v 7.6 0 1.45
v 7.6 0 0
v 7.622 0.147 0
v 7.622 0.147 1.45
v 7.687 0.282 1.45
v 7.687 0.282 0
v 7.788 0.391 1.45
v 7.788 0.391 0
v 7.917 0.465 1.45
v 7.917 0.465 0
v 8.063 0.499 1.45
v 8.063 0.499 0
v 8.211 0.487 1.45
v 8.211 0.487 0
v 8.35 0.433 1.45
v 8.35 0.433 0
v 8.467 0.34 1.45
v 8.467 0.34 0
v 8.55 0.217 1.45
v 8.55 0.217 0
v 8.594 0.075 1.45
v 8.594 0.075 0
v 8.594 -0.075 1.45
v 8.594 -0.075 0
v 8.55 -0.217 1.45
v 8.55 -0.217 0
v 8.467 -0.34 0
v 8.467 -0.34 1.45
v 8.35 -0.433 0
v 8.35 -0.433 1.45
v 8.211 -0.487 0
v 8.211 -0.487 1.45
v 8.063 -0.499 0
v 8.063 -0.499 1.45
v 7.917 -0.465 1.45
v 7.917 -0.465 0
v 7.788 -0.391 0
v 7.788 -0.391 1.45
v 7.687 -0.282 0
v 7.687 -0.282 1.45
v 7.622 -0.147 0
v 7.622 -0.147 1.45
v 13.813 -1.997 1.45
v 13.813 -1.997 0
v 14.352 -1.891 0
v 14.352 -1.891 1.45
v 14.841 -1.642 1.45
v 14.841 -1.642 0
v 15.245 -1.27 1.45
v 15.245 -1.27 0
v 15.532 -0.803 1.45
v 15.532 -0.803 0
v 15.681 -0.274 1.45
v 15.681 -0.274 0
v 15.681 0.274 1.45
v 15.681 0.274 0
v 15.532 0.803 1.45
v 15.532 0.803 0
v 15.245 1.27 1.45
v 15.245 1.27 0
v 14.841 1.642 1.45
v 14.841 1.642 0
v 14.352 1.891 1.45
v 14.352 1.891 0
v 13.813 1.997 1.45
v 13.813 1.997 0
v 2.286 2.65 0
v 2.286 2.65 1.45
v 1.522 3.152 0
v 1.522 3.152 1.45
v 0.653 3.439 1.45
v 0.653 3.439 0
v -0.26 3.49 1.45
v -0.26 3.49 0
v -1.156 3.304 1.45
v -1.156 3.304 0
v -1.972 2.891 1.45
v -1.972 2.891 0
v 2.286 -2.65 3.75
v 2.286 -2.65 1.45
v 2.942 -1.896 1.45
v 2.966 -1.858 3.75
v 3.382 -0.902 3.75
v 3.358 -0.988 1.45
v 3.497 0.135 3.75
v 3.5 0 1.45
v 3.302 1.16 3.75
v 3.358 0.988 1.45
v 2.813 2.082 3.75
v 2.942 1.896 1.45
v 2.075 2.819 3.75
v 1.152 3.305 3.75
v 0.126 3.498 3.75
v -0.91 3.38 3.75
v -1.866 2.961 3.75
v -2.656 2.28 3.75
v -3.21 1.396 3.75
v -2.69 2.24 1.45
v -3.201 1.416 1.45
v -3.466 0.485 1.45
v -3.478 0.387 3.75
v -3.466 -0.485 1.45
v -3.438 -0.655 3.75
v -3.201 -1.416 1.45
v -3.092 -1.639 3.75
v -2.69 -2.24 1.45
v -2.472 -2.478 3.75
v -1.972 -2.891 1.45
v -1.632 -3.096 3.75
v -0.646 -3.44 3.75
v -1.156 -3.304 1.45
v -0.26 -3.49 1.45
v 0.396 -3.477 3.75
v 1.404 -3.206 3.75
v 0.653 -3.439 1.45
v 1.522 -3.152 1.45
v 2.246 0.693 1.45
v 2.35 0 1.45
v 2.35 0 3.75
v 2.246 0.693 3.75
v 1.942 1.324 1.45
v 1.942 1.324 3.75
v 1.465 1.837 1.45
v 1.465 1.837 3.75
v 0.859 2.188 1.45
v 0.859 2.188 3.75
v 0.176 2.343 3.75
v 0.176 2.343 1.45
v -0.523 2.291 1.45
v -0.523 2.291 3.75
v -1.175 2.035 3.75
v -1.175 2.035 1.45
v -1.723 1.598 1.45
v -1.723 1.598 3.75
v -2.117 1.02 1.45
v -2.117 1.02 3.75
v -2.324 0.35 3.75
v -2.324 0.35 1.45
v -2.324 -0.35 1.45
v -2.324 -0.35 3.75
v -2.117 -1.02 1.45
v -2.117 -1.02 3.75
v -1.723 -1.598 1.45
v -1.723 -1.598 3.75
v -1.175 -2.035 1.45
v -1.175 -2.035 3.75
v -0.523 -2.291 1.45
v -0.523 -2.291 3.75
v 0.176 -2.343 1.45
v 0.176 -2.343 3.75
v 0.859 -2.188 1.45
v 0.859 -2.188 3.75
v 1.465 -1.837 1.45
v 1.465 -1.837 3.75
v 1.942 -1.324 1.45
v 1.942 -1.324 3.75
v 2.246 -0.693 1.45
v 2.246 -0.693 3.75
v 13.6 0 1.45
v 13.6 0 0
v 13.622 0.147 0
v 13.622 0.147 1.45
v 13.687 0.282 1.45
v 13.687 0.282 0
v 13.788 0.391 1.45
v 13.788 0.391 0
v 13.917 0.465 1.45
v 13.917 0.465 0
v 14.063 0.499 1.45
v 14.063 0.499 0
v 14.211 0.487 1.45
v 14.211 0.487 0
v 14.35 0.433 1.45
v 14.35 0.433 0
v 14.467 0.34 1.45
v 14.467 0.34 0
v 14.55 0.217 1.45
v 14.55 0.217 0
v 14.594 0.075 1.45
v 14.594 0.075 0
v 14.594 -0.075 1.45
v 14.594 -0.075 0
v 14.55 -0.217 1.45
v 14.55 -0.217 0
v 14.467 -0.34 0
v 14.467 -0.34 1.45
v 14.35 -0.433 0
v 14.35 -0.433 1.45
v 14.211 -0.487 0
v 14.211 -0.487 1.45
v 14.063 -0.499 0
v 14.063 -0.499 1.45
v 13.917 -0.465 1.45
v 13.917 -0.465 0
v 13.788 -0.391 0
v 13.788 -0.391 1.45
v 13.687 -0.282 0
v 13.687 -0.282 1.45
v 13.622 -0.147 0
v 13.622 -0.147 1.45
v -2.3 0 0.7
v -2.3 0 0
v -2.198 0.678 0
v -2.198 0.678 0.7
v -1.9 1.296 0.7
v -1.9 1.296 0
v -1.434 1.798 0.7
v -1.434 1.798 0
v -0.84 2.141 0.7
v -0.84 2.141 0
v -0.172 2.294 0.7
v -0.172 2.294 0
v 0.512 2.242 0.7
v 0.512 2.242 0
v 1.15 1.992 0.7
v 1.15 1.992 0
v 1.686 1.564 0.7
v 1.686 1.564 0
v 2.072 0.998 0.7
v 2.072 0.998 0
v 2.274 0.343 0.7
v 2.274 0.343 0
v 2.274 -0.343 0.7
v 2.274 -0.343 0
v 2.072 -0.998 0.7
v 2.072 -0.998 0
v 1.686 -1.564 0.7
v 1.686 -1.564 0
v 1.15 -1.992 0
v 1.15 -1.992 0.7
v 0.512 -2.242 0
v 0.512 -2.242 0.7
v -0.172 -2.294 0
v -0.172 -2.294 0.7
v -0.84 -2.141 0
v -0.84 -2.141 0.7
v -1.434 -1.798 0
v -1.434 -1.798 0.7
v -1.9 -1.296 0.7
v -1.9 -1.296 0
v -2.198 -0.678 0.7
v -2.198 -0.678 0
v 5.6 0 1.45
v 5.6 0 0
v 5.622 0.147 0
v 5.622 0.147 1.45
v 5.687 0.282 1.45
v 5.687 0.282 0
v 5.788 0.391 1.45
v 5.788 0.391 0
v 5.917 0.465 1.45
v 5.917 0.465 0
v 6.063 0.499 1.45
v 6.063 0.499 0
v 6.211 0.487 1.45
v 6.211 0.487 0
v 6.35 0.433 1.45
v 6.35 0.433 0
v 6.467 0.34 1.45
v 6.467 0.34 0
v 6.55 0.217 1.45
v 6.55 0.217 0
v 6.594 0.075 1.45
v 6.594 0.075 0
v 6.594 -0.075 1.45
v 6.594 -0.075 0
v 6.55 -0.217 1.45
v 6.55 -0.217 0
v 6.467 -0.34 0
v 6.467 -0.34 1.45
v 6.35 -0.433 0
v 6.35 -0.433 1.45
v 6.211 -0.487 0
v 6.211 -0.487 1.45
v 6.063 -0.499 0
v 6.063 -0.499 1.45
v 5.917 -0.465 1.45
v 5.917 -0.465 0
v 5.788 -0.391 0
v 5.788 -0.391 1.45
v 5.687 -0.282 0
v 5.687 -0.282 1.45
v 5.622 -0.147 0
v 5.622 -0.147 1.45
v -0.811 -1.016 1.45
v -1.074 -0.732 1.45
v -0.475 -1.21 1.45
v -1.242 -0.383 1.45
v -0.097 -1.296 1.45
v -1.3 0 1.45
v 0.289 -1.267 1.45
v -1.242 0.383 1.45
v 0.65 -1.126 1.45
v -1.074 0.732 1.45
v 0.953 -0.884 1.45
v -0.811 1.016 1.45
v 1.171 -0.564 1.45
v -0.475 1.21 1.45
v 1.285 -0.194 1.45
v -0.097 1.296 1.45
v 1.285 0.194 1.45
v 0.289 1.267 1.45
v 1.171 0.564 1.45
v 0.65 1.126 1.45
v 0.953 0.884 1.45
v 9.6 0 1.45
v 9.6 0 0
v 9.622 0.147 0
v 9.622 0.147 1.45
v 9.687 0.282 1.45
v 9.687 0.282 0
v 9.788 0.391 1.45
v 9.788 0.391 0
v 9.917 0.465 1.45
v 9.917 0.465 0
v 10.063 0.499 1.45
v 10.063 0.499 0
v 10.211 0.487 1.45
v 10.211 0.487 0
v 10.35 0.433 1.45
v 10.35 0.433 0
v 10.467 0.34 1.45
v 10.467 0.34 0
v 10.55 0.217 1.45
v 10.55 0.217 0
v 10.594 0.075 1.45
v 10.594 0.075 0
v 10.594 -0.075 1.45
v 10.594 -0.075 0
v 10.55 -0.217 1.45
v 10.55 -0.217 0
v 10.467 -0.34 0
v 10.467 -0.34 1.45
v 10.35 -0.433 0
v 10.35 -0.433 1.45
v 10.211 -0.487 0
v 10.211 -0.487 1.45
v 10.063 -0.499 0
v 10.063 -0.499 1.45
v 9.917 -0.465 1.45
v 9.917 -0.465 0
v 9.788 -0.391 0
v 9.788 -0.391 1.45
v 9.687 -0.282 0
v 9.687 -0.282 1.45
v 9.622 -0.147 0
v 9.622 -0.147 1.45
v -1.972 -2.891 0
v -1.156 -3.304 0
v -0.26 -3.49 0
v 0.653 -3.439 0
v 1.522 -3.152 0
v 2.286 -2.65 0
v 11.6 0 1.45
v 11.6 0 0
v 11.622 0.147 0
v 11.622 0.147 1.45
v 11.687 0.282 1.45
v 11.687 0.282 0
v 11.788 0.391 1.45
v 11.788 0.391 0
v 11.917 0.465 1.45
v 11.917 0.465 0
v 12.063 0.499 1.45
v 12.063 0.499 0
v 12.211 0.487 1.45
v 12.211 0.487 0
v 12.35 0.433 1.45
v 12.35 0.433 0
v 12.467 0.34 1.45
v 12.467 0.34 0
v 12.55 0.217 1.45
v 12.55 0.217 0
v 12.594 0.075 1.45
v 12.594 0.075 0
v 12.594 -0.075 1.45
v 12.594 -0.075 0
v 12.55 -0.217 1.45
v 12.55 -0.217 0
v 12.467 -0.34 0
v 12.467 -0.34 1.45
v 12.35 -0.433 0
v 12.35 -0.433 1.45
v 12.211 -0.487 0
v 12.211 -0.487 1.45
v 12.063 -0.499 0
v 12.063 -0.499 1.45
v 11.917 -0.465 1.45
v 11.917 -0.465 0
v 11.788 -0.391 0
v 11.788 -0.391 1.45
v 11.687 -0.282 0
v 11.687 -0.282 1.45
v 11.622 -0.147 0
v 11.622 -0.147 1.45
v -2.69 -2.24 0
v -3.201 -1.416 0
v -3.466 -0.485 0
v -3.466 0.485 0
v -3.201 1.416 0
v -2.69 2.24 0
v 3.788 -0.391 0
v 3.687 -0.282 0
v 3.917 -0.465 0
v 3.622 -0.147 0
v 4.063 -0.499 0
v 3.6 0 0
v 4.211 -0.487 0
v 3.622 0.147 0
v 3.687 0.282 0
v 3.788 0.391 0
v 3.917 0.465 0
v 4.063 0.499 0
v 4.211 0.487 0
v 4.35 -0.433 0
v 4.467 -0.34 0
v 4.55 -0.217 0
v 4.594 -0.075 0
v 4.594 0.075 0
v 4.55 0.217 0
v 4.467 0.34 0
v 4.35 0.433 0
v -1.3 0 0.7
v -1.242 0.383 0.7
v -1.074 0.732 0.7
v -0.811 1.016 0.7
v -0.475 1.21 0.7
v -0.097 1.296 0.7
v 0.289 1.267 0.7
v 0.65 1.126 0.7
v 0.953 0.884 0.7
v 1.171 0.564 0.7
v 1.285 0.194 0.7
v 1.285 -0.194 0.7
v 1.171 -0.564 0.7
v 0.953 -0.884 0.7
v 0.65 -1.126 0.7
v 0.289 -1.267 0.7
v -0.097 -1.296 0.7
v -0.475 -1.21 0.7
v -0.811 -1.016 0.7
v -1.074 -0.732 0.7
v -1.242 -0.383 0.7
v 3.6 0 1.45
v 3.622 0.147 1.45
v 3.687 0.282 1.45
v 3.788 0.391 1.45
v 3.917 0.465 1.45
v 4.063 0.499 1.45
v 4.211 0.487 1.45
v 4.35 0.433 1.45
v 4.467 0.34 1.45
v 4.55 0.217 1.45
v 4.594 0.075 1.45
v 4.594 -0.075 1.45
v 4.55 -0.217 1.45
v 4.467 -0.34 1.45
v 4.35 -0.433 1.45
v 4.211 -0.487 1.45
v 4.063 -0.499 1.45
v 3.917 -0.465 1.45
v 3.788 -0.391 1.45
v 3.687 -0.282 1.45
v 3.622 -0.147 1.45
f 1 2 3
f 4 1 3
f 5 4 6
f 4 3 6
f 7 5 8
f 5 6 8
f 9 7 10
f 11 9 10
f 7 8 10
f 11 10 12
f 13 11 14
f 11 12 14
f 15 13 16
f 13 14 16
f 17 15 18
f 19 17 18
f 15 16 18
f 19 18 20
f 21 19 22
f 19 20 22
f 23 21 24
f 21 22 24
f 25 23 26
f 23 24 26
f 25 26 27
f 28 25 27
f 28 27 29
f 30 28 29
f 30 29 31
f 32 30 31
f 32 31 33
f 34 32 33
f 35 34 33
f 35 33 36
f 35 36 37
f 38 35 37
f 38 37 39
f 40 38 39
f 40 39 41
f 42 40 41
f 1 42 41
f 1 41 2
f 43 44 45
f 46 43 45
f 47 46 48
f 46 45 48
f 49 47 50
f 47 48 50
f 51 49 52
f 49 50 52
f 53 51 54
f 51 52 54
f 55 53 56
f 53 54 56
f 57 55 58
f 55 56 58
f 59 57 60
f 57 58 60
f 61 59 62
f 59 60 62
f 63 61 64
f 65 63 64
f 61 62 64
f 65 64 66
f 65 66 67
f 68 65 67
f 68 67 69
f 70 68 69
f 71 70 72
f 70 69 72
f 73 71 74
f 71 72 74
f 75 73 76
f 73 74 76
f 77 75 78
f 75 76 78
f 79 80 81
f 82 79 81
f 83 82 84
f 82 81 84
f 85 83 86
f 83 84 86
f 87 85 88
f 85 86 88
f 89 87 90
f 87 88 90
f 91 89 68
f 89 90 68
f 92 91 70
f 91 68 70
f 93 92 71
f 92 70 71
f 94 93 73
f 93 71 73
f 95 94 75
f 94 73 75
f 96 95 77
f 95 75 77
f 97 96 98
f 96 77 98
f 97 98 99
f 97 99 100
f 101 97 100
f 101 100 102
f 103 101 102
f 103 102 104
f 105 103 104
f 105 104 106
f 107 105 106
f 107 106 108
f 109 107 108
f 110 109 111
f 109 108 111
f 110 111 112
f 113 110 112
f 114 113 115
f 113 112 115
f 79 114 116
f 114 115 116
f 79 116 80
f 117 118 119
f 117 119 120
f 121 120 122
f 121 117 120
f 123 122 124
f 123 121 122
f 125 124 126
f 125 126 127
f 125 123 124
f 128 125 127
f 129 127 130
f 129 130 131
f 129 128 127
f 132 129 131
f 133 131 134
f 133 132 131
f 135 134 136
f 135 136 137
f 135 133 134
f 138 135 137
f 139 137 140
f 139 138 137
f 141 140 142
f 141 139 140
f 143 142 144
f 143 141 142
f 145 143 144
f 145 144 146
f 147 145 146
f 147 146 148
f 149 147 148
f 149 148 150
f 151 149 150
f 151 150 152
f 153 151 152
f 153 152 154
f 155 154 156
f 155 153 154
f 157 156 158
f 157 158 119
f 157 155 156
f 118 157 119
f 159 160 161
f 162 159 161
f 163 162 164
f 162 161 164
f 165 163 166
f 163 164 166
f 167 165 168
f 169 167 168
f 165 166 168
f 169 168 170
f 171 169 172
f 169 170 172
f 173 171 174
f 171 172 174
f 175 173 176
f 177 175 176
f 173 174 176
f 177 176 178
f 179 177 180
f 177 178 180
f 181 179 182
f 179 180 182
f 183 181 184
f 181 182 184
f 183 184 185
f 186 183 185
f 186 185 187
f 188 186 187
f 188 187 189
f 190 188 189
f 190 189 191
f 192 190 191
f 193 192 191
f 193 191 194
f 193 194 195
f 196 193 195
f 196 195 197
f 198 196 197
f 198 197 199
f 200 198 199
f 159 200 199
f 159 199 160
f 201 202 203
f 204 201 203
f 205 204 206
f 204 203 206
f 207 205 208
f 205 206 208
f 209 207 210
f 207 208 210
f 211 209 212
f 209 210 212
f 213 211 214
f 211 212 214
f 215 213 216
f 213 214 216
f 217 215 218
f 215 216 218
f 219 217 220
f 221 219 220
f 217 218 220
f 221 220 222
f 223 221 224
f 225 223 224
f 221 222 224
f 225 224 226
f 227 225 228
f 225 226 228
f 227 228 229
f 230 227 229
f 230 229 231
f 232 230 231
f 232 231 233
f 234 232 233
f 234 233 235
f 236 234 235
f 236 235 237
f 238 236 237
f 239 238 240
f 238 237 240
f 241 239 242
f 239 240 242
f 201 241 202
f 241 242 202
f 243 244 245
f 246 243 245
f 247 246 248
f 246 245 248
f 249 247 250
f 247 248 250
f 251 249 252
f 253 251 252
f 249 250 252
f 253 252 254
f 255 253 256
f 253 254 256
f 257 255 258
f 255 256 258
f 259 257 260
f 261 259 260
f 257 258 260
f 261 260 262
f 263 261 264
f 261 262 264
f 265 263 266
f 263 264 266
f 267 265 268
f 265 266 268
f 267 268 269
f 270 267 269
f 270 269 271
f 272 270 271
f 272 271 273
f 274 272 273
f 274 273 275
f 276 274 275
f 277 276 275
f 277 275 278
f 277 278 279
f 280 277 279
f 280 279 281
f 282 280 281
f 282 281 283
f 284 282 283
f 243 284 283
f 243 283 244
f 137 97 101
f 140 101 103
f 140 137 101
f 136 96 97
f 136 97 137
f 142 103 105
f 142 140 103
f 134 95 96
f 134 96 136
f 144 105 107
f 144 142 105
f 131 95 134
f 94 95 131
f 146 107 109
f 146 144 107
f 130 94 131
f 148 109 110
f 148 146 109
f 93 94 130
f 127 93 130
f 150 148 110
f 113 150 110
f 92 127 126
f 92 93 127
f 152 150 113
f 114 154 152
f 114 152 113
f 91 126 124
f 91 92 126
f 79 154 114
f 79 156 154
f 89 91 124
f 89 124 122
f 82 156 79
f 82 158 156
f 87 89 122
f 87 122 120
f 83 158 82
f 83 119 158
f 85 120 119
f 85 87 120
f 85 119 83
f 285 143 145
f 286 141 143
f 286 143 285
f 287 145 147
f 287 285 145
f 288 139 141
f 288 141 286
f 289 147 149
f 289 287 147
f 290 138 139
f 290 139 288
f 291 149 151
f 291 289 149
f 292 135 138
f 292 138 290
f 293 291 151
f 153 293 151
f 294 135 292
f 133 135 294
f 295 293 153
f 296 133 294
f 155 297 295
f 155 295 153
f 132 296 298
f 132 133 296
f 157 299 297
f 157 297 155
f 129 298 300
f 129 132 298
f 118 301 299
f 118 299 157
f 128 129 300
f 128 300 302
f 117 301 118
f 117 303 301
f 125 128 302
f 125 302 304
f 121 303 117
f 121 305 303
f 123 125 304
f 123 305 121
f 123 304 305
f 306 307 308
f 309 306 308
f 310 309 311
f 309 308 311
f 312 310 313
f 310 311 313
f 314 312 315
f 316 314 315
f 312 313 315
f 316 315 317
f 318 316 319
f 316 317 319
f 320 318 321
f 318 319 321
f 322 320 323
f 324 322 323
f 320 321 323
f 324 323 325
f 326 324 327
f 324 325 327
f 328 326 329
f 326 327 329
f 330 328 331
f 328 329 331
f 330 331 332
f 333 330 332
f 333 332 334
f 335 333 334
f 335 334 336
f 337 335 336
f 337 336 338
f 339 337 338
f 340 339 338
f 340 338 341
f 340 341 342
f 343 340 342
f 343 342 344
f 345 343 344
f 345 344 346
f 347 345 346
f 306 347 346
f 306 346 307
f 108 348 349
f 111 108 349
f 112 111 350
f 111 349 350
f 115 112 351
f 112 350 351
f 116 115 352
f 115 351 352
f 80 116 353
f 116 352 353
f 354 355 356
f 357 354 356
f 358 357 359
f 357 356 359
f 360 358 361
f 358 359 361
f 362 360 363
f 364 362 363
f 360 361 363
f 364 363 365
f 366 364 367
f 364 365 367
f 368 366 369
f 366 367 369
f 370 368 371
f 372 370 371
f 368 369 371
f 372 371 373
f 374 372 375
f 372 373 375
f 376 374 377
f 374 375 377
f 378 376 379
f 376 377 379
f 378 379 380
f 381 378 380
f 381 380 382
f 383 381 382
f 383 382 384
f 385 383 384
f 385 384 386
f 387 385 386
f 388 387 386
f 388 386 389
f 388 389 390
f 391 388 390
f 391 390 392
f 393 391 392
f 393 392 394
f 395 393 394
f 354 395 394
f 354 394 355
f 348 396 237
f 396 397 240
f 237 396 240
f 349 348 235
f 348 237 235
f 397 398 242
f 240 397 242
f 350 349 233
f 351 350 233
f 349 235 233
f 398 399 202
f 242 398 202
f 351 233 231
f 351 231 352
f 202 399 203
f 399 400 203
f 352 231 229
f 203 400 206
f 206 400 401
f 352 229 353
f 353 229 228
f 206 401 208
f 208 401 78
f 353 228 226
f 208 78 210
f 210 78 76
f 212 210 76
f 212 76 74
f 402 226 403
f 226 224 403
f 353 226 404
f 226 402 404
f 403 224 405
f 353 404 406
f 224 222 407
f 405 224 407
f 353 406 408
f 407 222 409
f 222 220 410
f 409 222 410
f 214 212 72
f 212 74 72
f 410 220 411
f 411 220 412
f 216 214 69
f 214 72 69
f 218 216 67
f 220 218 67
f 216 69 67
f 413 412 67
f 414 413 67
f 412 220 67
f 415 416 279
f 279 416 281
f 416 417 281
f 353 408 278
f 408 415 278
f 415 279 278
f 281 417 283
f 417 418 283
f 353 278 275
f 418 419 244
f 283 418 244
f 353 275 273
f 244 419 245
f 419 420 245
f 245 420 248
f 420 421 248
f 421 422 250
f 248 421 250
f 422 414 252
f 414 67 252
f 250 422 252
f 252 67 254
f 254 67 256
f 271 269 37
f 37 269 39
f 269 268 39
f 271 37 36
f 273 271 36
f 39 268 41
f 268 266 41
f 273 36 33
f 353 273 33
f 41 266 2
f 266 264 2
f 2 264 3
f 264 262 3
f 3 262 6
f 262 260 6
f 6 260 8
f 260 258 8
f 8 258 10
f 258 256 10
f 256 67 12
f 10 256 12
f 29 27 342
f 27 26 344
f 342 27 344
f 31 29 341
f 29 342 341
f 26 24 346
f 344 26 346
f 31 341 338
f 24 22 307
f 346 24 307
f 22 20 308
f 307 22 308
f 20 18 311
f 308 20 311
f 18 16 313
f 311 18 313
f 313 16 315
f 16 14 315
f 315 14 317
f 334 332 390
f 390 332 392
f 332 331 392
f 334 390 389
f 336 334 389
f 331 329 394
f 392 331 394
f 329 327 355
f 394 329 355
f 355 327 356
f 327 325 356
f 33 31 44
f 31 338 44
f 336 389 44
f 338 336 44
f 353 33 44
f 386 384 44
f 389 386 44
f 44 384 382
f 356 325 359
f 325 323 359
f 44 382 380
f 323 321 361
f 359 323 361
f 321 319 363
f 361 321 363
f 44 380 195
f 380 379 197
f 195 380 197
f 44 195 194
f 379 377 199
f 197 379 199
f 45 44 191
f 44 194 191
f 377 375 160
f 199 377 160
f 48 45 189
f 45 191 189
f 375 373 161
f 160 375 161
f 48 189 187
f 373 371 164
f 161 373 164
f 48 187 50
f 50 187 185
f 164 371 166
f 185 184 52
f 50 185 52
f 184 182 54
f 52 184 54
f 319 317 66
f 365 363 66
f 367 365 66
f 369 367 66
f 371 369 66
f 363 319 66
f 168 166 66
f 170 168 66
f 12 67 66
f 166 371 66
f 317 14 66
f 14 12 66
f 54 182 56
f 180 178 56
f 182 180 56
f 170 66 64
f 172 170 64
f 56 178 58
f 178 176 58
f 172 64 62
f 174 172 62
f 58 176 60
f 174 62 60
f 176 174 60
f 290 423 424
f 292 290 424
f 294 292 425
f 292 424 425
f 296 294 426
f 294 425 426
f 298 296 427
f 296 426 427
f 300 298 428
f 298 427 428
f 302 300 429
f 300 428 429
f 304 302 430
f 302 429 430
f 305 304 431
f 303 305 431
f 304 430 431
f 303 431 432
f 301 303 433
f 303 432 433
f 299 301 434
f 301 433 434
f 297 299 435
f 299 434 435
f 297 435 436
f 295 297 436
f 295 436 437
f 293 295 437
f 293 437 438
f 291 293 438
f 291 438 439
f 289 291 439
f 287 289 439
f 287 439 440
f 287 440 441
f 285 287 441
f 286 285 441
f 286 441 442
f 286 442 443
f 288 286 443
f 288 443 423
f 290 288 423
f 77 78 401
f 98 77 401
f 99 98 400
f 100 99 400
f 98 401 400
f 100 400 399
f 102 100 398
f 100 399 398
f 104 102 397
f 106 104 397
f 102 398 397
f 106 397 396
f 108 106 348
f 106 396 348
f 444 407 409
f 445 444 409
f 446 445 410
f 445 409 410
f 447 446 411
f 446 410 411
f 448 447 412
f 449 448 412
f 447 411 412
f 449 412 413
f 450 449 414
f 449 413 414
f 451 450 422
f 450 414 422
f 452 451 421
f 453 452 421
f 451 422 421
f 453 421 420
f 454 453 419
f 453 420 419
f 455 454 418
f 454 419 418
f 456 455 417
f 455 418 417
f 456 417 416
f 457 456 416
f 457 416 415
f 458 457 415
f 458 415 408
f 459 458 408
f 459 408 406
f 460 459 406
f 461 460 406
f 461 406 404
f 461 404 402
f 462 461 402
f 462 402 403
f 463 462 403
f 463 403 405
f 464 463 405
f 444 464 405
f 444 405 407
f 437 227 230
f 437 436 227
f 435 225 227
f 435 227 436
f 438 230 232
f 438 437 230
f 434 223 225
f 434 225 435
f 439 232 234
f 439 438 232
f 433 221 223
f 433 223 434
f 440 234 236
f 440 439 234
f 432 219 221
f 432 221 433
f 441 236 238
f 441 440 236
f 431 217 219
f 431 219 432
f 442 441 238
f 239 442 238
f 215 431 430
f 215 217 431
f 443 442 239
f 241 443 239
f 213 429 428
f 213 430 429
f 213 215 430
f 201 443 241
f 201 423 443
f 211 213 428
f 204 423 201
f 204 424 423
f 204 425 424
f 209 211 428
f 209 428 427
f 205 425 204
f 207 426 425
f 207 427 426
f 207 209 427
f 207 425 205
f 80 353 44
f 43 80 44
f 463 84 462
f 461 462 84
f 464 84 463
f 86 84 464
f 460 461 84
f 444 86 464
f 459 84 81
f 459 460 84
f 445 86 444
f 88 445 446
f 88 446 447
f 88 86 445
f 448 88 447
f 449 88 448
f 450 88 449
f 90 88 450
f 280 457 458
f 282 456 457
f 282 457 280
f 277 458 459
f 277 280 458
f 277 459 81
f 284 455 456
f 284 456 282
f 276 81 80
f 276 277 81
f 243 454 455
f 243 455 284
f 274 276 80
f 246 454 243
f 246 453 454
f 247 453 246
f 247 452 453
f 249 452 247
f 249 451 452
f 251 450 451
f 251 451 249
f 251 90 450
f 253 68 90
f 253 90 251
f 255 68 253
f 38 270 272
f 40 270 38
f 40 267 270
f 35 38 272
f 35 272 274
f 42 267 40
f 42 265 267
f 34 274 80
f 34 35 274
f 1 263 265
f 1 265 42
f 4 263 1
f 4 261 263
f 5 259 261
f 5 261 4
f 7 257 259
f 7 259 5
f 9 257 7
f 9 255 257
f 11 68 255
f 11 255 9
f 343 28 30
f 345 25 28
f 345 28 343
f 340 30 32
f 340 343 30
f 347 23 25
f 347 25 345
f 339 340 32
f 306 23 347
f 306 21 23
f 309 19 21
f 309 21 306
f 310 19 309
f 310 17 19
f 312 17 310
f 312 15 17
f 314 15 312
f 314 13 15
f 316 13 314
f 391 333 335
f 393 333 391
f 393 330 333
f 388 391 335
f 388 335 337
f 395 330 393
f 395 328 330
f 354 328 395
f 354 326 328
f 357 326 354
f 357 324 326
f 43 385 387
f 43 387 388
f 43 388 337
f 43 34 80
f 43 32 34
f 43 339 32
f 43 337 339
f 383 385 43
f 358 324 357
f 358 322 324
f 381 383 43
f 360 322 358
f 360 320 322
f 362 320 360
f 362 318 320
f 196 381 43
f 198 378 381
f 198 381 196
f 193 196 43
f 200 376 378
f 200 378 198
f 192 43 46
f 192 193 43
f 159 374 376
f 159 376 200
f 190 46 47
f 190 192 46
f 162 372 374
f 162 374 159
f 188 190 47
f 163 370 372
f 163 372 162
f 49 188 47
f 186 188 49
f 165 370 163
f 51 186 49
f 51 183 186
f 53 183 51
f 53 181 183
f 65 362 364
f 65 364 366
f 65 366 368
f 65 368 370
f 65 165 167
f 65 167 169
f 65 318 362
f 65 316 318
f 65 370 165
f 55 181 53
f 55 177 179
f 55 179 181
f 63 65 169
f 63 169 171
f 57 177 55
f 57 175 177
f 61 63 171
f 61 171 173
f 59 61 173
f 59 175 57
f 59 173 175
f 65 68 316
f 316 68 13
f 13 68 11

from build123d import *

# Parameters (mm, degrees)
SKETCH_1_R             = 2.775112647
SKETCH_1_R_2           = 2
SKETCH_1_R_3           = 3.5
EXTRUDE_1_DEPTH        = 1.45
SKETCH_2_R             = 3.5
SKETCH_2_R_2           = 2.35
EXTRUDE_2_DEPTH        = 2.3
SKETCH_3_R             = 2.3
CUT_EXTRUDE_1_DEPTH    = 0.7
SKETCH_4_R             = 1.3
CUT_EXTRUDE_2_DEPTH    = 17.372003543
SKETCH_5_R             = 0.5
CUT_EXTRUDE_3_DEPTH    = 17.516733939
PATTERN_LINEAR_1_COUNT = 6
PATTERN_LINEAR_1_PITCH = 2


with BuildPart() as part:
    # 草图1 → 凸台-拉伸1 (new body)
    with BuildSketch(Plane.XY):
        with BuildLine():
            Line((0.157009161, 2.770667488), (-1.972354438, 2.891334981))
            ThreePointArc((-1.972354438, 2.891334981), (-3.5, 0), (-1.972354438, -2.891334981))
            Line((-1.972354438, -2.891334981), (0.1570091, -2.770667491))
            ThreePointArc((0.1570091, -2.770667491), (-2.775112647, 3.1e-08), (0.157009161, 2.770667488))
        make_face()
        with BuildLine():
            Line((2.286372673, 2.65), (0.157009161, 2.770667488))
            ThreePointArc((0.157009161, 2.770667488), (2.017048378, 1.905981649), (2.775112647, 0))
            ThreePointArc((2.775112647, 0), (2.017048356, -1.905981672), (0.1570091, -2.770667491))
            Line((0.1570091, -2.770667491), (2.286372673, -2.65))
            ThreePointArc((2.286372673, -2.65), (3.182161557, -1.457342726), (3.5, 0))
            ThreePointArc((3.5, 0), (3.182161557, 1.457342726), (2.286372673, 2.65))
        make_face()
        Circle(SKETCH_1_R)
        with BuildLine():
            ThreePointArc((2.286372673, 2.65), (0.198021479, 3.494393723), (-1.972354438, 2.891334981))
            Line((-1.972354438, 2.891334981), (0.157009161, 2.770667488))
            Line((0.157009161, 2.770667488), (2.286372673, 2.65))
        make_face()
        with BuildLine():
            Line((0.1570091, -2.770667491), (-1.972354438, -2.891334981))
            ThreePointArc((-1.972354438, -2.891334981), (0.198021479, -3.494393723), (2.286372673, -2.65))
            Line((2.286372673, -2.65), (0.1570091, -2.770667491))
        make_face()
        with BuildLine():
            Line((13.813155138, 1.996796413), (2.286372673, 2.65))
            ThreePointArc((2.286372673, 2.65), (3.182161557, 1.457342726), (3.5, 0))
            ThreePointArc((3.5, 0), (3.182161557, -1.457342726), (2.286372673, -2.65))
            Line((2.286372673, -2.65), (13.813155123, -1.996796414))
            ThreePointArc((13.813155123, -1.996796414), (11.7, 8e-09), (13.813155138, 1.996796413))
        make_face()
        with Locations((13.7, 0)):
            Circle(SKETCH_1_R_2)
        Circle(SKETCH_1_R_3)
    extrude(amount=EXTRUDE_1_DEPTH)

    # 草图2 → 凸台-拉伸2 (add)
    with BuildSketch(Plane.XY.offset(1.45)):
        with Locations(Location((0, 0, 0), (0, 0, 310.787038193))):
            Circle(SKETCH_2_R)
        Circle(SKETCH_2_R_2, mode=Mode.SUBTRACT)
    extrude(amount=EXTRUDE_2_DEPTH)

    # 草图3 → 切除-拉伸1 (cut)
    with BuildSketch(Plane(origin=(0, 0, 0), x_dir=(-1, 0, 0), z_dir=(0, 0, -1))):
        Circle(SKETCH_3_R)
    extrude(amount=-CUT_EXTRUDE_1_DEPTH, mode=Mode.SUBTRACT)

    # 草图4 → 切除-拉伸2 (cut, through all)
    with BuildSketch(Plane(origin=(0, 0, 0.7), x_dir=(-1, 0, 0), z_dir=(0, 0, -1))):
        Circle(SKETCH_4_R)
    extrude(amount=-CUT_EXTRUDE_2_DEPTH, mode=Mode.SUBTRACT)

    # 草图5 → 切除-拉伸3 (cut, through all)
    with BuildSketch(Plane(origin=(0, 0, 0), x_dir=(-1, 0, 0), z_dir=(0, 0, -1))):
        with Locations((-14.1, 0)):
            Circle(SKETCH_5_R)
    cut_extrude_3 = extrude(amount=-CUT_EXTRUDE_3_DEPTH, mode=Mode.SUBTRACT)

    # 阵列(线性)1: 切除-拉伸3 ×6
    with Locations(*[(-i * PATTERN_LINEAR_1_PITCH, 0, 0) for i in range(1, PATTERN_LINEAR_1_COUNT)]):
        add(cut_extrude_3, mode=Mode.SUBTRACT)


solid = part.part
